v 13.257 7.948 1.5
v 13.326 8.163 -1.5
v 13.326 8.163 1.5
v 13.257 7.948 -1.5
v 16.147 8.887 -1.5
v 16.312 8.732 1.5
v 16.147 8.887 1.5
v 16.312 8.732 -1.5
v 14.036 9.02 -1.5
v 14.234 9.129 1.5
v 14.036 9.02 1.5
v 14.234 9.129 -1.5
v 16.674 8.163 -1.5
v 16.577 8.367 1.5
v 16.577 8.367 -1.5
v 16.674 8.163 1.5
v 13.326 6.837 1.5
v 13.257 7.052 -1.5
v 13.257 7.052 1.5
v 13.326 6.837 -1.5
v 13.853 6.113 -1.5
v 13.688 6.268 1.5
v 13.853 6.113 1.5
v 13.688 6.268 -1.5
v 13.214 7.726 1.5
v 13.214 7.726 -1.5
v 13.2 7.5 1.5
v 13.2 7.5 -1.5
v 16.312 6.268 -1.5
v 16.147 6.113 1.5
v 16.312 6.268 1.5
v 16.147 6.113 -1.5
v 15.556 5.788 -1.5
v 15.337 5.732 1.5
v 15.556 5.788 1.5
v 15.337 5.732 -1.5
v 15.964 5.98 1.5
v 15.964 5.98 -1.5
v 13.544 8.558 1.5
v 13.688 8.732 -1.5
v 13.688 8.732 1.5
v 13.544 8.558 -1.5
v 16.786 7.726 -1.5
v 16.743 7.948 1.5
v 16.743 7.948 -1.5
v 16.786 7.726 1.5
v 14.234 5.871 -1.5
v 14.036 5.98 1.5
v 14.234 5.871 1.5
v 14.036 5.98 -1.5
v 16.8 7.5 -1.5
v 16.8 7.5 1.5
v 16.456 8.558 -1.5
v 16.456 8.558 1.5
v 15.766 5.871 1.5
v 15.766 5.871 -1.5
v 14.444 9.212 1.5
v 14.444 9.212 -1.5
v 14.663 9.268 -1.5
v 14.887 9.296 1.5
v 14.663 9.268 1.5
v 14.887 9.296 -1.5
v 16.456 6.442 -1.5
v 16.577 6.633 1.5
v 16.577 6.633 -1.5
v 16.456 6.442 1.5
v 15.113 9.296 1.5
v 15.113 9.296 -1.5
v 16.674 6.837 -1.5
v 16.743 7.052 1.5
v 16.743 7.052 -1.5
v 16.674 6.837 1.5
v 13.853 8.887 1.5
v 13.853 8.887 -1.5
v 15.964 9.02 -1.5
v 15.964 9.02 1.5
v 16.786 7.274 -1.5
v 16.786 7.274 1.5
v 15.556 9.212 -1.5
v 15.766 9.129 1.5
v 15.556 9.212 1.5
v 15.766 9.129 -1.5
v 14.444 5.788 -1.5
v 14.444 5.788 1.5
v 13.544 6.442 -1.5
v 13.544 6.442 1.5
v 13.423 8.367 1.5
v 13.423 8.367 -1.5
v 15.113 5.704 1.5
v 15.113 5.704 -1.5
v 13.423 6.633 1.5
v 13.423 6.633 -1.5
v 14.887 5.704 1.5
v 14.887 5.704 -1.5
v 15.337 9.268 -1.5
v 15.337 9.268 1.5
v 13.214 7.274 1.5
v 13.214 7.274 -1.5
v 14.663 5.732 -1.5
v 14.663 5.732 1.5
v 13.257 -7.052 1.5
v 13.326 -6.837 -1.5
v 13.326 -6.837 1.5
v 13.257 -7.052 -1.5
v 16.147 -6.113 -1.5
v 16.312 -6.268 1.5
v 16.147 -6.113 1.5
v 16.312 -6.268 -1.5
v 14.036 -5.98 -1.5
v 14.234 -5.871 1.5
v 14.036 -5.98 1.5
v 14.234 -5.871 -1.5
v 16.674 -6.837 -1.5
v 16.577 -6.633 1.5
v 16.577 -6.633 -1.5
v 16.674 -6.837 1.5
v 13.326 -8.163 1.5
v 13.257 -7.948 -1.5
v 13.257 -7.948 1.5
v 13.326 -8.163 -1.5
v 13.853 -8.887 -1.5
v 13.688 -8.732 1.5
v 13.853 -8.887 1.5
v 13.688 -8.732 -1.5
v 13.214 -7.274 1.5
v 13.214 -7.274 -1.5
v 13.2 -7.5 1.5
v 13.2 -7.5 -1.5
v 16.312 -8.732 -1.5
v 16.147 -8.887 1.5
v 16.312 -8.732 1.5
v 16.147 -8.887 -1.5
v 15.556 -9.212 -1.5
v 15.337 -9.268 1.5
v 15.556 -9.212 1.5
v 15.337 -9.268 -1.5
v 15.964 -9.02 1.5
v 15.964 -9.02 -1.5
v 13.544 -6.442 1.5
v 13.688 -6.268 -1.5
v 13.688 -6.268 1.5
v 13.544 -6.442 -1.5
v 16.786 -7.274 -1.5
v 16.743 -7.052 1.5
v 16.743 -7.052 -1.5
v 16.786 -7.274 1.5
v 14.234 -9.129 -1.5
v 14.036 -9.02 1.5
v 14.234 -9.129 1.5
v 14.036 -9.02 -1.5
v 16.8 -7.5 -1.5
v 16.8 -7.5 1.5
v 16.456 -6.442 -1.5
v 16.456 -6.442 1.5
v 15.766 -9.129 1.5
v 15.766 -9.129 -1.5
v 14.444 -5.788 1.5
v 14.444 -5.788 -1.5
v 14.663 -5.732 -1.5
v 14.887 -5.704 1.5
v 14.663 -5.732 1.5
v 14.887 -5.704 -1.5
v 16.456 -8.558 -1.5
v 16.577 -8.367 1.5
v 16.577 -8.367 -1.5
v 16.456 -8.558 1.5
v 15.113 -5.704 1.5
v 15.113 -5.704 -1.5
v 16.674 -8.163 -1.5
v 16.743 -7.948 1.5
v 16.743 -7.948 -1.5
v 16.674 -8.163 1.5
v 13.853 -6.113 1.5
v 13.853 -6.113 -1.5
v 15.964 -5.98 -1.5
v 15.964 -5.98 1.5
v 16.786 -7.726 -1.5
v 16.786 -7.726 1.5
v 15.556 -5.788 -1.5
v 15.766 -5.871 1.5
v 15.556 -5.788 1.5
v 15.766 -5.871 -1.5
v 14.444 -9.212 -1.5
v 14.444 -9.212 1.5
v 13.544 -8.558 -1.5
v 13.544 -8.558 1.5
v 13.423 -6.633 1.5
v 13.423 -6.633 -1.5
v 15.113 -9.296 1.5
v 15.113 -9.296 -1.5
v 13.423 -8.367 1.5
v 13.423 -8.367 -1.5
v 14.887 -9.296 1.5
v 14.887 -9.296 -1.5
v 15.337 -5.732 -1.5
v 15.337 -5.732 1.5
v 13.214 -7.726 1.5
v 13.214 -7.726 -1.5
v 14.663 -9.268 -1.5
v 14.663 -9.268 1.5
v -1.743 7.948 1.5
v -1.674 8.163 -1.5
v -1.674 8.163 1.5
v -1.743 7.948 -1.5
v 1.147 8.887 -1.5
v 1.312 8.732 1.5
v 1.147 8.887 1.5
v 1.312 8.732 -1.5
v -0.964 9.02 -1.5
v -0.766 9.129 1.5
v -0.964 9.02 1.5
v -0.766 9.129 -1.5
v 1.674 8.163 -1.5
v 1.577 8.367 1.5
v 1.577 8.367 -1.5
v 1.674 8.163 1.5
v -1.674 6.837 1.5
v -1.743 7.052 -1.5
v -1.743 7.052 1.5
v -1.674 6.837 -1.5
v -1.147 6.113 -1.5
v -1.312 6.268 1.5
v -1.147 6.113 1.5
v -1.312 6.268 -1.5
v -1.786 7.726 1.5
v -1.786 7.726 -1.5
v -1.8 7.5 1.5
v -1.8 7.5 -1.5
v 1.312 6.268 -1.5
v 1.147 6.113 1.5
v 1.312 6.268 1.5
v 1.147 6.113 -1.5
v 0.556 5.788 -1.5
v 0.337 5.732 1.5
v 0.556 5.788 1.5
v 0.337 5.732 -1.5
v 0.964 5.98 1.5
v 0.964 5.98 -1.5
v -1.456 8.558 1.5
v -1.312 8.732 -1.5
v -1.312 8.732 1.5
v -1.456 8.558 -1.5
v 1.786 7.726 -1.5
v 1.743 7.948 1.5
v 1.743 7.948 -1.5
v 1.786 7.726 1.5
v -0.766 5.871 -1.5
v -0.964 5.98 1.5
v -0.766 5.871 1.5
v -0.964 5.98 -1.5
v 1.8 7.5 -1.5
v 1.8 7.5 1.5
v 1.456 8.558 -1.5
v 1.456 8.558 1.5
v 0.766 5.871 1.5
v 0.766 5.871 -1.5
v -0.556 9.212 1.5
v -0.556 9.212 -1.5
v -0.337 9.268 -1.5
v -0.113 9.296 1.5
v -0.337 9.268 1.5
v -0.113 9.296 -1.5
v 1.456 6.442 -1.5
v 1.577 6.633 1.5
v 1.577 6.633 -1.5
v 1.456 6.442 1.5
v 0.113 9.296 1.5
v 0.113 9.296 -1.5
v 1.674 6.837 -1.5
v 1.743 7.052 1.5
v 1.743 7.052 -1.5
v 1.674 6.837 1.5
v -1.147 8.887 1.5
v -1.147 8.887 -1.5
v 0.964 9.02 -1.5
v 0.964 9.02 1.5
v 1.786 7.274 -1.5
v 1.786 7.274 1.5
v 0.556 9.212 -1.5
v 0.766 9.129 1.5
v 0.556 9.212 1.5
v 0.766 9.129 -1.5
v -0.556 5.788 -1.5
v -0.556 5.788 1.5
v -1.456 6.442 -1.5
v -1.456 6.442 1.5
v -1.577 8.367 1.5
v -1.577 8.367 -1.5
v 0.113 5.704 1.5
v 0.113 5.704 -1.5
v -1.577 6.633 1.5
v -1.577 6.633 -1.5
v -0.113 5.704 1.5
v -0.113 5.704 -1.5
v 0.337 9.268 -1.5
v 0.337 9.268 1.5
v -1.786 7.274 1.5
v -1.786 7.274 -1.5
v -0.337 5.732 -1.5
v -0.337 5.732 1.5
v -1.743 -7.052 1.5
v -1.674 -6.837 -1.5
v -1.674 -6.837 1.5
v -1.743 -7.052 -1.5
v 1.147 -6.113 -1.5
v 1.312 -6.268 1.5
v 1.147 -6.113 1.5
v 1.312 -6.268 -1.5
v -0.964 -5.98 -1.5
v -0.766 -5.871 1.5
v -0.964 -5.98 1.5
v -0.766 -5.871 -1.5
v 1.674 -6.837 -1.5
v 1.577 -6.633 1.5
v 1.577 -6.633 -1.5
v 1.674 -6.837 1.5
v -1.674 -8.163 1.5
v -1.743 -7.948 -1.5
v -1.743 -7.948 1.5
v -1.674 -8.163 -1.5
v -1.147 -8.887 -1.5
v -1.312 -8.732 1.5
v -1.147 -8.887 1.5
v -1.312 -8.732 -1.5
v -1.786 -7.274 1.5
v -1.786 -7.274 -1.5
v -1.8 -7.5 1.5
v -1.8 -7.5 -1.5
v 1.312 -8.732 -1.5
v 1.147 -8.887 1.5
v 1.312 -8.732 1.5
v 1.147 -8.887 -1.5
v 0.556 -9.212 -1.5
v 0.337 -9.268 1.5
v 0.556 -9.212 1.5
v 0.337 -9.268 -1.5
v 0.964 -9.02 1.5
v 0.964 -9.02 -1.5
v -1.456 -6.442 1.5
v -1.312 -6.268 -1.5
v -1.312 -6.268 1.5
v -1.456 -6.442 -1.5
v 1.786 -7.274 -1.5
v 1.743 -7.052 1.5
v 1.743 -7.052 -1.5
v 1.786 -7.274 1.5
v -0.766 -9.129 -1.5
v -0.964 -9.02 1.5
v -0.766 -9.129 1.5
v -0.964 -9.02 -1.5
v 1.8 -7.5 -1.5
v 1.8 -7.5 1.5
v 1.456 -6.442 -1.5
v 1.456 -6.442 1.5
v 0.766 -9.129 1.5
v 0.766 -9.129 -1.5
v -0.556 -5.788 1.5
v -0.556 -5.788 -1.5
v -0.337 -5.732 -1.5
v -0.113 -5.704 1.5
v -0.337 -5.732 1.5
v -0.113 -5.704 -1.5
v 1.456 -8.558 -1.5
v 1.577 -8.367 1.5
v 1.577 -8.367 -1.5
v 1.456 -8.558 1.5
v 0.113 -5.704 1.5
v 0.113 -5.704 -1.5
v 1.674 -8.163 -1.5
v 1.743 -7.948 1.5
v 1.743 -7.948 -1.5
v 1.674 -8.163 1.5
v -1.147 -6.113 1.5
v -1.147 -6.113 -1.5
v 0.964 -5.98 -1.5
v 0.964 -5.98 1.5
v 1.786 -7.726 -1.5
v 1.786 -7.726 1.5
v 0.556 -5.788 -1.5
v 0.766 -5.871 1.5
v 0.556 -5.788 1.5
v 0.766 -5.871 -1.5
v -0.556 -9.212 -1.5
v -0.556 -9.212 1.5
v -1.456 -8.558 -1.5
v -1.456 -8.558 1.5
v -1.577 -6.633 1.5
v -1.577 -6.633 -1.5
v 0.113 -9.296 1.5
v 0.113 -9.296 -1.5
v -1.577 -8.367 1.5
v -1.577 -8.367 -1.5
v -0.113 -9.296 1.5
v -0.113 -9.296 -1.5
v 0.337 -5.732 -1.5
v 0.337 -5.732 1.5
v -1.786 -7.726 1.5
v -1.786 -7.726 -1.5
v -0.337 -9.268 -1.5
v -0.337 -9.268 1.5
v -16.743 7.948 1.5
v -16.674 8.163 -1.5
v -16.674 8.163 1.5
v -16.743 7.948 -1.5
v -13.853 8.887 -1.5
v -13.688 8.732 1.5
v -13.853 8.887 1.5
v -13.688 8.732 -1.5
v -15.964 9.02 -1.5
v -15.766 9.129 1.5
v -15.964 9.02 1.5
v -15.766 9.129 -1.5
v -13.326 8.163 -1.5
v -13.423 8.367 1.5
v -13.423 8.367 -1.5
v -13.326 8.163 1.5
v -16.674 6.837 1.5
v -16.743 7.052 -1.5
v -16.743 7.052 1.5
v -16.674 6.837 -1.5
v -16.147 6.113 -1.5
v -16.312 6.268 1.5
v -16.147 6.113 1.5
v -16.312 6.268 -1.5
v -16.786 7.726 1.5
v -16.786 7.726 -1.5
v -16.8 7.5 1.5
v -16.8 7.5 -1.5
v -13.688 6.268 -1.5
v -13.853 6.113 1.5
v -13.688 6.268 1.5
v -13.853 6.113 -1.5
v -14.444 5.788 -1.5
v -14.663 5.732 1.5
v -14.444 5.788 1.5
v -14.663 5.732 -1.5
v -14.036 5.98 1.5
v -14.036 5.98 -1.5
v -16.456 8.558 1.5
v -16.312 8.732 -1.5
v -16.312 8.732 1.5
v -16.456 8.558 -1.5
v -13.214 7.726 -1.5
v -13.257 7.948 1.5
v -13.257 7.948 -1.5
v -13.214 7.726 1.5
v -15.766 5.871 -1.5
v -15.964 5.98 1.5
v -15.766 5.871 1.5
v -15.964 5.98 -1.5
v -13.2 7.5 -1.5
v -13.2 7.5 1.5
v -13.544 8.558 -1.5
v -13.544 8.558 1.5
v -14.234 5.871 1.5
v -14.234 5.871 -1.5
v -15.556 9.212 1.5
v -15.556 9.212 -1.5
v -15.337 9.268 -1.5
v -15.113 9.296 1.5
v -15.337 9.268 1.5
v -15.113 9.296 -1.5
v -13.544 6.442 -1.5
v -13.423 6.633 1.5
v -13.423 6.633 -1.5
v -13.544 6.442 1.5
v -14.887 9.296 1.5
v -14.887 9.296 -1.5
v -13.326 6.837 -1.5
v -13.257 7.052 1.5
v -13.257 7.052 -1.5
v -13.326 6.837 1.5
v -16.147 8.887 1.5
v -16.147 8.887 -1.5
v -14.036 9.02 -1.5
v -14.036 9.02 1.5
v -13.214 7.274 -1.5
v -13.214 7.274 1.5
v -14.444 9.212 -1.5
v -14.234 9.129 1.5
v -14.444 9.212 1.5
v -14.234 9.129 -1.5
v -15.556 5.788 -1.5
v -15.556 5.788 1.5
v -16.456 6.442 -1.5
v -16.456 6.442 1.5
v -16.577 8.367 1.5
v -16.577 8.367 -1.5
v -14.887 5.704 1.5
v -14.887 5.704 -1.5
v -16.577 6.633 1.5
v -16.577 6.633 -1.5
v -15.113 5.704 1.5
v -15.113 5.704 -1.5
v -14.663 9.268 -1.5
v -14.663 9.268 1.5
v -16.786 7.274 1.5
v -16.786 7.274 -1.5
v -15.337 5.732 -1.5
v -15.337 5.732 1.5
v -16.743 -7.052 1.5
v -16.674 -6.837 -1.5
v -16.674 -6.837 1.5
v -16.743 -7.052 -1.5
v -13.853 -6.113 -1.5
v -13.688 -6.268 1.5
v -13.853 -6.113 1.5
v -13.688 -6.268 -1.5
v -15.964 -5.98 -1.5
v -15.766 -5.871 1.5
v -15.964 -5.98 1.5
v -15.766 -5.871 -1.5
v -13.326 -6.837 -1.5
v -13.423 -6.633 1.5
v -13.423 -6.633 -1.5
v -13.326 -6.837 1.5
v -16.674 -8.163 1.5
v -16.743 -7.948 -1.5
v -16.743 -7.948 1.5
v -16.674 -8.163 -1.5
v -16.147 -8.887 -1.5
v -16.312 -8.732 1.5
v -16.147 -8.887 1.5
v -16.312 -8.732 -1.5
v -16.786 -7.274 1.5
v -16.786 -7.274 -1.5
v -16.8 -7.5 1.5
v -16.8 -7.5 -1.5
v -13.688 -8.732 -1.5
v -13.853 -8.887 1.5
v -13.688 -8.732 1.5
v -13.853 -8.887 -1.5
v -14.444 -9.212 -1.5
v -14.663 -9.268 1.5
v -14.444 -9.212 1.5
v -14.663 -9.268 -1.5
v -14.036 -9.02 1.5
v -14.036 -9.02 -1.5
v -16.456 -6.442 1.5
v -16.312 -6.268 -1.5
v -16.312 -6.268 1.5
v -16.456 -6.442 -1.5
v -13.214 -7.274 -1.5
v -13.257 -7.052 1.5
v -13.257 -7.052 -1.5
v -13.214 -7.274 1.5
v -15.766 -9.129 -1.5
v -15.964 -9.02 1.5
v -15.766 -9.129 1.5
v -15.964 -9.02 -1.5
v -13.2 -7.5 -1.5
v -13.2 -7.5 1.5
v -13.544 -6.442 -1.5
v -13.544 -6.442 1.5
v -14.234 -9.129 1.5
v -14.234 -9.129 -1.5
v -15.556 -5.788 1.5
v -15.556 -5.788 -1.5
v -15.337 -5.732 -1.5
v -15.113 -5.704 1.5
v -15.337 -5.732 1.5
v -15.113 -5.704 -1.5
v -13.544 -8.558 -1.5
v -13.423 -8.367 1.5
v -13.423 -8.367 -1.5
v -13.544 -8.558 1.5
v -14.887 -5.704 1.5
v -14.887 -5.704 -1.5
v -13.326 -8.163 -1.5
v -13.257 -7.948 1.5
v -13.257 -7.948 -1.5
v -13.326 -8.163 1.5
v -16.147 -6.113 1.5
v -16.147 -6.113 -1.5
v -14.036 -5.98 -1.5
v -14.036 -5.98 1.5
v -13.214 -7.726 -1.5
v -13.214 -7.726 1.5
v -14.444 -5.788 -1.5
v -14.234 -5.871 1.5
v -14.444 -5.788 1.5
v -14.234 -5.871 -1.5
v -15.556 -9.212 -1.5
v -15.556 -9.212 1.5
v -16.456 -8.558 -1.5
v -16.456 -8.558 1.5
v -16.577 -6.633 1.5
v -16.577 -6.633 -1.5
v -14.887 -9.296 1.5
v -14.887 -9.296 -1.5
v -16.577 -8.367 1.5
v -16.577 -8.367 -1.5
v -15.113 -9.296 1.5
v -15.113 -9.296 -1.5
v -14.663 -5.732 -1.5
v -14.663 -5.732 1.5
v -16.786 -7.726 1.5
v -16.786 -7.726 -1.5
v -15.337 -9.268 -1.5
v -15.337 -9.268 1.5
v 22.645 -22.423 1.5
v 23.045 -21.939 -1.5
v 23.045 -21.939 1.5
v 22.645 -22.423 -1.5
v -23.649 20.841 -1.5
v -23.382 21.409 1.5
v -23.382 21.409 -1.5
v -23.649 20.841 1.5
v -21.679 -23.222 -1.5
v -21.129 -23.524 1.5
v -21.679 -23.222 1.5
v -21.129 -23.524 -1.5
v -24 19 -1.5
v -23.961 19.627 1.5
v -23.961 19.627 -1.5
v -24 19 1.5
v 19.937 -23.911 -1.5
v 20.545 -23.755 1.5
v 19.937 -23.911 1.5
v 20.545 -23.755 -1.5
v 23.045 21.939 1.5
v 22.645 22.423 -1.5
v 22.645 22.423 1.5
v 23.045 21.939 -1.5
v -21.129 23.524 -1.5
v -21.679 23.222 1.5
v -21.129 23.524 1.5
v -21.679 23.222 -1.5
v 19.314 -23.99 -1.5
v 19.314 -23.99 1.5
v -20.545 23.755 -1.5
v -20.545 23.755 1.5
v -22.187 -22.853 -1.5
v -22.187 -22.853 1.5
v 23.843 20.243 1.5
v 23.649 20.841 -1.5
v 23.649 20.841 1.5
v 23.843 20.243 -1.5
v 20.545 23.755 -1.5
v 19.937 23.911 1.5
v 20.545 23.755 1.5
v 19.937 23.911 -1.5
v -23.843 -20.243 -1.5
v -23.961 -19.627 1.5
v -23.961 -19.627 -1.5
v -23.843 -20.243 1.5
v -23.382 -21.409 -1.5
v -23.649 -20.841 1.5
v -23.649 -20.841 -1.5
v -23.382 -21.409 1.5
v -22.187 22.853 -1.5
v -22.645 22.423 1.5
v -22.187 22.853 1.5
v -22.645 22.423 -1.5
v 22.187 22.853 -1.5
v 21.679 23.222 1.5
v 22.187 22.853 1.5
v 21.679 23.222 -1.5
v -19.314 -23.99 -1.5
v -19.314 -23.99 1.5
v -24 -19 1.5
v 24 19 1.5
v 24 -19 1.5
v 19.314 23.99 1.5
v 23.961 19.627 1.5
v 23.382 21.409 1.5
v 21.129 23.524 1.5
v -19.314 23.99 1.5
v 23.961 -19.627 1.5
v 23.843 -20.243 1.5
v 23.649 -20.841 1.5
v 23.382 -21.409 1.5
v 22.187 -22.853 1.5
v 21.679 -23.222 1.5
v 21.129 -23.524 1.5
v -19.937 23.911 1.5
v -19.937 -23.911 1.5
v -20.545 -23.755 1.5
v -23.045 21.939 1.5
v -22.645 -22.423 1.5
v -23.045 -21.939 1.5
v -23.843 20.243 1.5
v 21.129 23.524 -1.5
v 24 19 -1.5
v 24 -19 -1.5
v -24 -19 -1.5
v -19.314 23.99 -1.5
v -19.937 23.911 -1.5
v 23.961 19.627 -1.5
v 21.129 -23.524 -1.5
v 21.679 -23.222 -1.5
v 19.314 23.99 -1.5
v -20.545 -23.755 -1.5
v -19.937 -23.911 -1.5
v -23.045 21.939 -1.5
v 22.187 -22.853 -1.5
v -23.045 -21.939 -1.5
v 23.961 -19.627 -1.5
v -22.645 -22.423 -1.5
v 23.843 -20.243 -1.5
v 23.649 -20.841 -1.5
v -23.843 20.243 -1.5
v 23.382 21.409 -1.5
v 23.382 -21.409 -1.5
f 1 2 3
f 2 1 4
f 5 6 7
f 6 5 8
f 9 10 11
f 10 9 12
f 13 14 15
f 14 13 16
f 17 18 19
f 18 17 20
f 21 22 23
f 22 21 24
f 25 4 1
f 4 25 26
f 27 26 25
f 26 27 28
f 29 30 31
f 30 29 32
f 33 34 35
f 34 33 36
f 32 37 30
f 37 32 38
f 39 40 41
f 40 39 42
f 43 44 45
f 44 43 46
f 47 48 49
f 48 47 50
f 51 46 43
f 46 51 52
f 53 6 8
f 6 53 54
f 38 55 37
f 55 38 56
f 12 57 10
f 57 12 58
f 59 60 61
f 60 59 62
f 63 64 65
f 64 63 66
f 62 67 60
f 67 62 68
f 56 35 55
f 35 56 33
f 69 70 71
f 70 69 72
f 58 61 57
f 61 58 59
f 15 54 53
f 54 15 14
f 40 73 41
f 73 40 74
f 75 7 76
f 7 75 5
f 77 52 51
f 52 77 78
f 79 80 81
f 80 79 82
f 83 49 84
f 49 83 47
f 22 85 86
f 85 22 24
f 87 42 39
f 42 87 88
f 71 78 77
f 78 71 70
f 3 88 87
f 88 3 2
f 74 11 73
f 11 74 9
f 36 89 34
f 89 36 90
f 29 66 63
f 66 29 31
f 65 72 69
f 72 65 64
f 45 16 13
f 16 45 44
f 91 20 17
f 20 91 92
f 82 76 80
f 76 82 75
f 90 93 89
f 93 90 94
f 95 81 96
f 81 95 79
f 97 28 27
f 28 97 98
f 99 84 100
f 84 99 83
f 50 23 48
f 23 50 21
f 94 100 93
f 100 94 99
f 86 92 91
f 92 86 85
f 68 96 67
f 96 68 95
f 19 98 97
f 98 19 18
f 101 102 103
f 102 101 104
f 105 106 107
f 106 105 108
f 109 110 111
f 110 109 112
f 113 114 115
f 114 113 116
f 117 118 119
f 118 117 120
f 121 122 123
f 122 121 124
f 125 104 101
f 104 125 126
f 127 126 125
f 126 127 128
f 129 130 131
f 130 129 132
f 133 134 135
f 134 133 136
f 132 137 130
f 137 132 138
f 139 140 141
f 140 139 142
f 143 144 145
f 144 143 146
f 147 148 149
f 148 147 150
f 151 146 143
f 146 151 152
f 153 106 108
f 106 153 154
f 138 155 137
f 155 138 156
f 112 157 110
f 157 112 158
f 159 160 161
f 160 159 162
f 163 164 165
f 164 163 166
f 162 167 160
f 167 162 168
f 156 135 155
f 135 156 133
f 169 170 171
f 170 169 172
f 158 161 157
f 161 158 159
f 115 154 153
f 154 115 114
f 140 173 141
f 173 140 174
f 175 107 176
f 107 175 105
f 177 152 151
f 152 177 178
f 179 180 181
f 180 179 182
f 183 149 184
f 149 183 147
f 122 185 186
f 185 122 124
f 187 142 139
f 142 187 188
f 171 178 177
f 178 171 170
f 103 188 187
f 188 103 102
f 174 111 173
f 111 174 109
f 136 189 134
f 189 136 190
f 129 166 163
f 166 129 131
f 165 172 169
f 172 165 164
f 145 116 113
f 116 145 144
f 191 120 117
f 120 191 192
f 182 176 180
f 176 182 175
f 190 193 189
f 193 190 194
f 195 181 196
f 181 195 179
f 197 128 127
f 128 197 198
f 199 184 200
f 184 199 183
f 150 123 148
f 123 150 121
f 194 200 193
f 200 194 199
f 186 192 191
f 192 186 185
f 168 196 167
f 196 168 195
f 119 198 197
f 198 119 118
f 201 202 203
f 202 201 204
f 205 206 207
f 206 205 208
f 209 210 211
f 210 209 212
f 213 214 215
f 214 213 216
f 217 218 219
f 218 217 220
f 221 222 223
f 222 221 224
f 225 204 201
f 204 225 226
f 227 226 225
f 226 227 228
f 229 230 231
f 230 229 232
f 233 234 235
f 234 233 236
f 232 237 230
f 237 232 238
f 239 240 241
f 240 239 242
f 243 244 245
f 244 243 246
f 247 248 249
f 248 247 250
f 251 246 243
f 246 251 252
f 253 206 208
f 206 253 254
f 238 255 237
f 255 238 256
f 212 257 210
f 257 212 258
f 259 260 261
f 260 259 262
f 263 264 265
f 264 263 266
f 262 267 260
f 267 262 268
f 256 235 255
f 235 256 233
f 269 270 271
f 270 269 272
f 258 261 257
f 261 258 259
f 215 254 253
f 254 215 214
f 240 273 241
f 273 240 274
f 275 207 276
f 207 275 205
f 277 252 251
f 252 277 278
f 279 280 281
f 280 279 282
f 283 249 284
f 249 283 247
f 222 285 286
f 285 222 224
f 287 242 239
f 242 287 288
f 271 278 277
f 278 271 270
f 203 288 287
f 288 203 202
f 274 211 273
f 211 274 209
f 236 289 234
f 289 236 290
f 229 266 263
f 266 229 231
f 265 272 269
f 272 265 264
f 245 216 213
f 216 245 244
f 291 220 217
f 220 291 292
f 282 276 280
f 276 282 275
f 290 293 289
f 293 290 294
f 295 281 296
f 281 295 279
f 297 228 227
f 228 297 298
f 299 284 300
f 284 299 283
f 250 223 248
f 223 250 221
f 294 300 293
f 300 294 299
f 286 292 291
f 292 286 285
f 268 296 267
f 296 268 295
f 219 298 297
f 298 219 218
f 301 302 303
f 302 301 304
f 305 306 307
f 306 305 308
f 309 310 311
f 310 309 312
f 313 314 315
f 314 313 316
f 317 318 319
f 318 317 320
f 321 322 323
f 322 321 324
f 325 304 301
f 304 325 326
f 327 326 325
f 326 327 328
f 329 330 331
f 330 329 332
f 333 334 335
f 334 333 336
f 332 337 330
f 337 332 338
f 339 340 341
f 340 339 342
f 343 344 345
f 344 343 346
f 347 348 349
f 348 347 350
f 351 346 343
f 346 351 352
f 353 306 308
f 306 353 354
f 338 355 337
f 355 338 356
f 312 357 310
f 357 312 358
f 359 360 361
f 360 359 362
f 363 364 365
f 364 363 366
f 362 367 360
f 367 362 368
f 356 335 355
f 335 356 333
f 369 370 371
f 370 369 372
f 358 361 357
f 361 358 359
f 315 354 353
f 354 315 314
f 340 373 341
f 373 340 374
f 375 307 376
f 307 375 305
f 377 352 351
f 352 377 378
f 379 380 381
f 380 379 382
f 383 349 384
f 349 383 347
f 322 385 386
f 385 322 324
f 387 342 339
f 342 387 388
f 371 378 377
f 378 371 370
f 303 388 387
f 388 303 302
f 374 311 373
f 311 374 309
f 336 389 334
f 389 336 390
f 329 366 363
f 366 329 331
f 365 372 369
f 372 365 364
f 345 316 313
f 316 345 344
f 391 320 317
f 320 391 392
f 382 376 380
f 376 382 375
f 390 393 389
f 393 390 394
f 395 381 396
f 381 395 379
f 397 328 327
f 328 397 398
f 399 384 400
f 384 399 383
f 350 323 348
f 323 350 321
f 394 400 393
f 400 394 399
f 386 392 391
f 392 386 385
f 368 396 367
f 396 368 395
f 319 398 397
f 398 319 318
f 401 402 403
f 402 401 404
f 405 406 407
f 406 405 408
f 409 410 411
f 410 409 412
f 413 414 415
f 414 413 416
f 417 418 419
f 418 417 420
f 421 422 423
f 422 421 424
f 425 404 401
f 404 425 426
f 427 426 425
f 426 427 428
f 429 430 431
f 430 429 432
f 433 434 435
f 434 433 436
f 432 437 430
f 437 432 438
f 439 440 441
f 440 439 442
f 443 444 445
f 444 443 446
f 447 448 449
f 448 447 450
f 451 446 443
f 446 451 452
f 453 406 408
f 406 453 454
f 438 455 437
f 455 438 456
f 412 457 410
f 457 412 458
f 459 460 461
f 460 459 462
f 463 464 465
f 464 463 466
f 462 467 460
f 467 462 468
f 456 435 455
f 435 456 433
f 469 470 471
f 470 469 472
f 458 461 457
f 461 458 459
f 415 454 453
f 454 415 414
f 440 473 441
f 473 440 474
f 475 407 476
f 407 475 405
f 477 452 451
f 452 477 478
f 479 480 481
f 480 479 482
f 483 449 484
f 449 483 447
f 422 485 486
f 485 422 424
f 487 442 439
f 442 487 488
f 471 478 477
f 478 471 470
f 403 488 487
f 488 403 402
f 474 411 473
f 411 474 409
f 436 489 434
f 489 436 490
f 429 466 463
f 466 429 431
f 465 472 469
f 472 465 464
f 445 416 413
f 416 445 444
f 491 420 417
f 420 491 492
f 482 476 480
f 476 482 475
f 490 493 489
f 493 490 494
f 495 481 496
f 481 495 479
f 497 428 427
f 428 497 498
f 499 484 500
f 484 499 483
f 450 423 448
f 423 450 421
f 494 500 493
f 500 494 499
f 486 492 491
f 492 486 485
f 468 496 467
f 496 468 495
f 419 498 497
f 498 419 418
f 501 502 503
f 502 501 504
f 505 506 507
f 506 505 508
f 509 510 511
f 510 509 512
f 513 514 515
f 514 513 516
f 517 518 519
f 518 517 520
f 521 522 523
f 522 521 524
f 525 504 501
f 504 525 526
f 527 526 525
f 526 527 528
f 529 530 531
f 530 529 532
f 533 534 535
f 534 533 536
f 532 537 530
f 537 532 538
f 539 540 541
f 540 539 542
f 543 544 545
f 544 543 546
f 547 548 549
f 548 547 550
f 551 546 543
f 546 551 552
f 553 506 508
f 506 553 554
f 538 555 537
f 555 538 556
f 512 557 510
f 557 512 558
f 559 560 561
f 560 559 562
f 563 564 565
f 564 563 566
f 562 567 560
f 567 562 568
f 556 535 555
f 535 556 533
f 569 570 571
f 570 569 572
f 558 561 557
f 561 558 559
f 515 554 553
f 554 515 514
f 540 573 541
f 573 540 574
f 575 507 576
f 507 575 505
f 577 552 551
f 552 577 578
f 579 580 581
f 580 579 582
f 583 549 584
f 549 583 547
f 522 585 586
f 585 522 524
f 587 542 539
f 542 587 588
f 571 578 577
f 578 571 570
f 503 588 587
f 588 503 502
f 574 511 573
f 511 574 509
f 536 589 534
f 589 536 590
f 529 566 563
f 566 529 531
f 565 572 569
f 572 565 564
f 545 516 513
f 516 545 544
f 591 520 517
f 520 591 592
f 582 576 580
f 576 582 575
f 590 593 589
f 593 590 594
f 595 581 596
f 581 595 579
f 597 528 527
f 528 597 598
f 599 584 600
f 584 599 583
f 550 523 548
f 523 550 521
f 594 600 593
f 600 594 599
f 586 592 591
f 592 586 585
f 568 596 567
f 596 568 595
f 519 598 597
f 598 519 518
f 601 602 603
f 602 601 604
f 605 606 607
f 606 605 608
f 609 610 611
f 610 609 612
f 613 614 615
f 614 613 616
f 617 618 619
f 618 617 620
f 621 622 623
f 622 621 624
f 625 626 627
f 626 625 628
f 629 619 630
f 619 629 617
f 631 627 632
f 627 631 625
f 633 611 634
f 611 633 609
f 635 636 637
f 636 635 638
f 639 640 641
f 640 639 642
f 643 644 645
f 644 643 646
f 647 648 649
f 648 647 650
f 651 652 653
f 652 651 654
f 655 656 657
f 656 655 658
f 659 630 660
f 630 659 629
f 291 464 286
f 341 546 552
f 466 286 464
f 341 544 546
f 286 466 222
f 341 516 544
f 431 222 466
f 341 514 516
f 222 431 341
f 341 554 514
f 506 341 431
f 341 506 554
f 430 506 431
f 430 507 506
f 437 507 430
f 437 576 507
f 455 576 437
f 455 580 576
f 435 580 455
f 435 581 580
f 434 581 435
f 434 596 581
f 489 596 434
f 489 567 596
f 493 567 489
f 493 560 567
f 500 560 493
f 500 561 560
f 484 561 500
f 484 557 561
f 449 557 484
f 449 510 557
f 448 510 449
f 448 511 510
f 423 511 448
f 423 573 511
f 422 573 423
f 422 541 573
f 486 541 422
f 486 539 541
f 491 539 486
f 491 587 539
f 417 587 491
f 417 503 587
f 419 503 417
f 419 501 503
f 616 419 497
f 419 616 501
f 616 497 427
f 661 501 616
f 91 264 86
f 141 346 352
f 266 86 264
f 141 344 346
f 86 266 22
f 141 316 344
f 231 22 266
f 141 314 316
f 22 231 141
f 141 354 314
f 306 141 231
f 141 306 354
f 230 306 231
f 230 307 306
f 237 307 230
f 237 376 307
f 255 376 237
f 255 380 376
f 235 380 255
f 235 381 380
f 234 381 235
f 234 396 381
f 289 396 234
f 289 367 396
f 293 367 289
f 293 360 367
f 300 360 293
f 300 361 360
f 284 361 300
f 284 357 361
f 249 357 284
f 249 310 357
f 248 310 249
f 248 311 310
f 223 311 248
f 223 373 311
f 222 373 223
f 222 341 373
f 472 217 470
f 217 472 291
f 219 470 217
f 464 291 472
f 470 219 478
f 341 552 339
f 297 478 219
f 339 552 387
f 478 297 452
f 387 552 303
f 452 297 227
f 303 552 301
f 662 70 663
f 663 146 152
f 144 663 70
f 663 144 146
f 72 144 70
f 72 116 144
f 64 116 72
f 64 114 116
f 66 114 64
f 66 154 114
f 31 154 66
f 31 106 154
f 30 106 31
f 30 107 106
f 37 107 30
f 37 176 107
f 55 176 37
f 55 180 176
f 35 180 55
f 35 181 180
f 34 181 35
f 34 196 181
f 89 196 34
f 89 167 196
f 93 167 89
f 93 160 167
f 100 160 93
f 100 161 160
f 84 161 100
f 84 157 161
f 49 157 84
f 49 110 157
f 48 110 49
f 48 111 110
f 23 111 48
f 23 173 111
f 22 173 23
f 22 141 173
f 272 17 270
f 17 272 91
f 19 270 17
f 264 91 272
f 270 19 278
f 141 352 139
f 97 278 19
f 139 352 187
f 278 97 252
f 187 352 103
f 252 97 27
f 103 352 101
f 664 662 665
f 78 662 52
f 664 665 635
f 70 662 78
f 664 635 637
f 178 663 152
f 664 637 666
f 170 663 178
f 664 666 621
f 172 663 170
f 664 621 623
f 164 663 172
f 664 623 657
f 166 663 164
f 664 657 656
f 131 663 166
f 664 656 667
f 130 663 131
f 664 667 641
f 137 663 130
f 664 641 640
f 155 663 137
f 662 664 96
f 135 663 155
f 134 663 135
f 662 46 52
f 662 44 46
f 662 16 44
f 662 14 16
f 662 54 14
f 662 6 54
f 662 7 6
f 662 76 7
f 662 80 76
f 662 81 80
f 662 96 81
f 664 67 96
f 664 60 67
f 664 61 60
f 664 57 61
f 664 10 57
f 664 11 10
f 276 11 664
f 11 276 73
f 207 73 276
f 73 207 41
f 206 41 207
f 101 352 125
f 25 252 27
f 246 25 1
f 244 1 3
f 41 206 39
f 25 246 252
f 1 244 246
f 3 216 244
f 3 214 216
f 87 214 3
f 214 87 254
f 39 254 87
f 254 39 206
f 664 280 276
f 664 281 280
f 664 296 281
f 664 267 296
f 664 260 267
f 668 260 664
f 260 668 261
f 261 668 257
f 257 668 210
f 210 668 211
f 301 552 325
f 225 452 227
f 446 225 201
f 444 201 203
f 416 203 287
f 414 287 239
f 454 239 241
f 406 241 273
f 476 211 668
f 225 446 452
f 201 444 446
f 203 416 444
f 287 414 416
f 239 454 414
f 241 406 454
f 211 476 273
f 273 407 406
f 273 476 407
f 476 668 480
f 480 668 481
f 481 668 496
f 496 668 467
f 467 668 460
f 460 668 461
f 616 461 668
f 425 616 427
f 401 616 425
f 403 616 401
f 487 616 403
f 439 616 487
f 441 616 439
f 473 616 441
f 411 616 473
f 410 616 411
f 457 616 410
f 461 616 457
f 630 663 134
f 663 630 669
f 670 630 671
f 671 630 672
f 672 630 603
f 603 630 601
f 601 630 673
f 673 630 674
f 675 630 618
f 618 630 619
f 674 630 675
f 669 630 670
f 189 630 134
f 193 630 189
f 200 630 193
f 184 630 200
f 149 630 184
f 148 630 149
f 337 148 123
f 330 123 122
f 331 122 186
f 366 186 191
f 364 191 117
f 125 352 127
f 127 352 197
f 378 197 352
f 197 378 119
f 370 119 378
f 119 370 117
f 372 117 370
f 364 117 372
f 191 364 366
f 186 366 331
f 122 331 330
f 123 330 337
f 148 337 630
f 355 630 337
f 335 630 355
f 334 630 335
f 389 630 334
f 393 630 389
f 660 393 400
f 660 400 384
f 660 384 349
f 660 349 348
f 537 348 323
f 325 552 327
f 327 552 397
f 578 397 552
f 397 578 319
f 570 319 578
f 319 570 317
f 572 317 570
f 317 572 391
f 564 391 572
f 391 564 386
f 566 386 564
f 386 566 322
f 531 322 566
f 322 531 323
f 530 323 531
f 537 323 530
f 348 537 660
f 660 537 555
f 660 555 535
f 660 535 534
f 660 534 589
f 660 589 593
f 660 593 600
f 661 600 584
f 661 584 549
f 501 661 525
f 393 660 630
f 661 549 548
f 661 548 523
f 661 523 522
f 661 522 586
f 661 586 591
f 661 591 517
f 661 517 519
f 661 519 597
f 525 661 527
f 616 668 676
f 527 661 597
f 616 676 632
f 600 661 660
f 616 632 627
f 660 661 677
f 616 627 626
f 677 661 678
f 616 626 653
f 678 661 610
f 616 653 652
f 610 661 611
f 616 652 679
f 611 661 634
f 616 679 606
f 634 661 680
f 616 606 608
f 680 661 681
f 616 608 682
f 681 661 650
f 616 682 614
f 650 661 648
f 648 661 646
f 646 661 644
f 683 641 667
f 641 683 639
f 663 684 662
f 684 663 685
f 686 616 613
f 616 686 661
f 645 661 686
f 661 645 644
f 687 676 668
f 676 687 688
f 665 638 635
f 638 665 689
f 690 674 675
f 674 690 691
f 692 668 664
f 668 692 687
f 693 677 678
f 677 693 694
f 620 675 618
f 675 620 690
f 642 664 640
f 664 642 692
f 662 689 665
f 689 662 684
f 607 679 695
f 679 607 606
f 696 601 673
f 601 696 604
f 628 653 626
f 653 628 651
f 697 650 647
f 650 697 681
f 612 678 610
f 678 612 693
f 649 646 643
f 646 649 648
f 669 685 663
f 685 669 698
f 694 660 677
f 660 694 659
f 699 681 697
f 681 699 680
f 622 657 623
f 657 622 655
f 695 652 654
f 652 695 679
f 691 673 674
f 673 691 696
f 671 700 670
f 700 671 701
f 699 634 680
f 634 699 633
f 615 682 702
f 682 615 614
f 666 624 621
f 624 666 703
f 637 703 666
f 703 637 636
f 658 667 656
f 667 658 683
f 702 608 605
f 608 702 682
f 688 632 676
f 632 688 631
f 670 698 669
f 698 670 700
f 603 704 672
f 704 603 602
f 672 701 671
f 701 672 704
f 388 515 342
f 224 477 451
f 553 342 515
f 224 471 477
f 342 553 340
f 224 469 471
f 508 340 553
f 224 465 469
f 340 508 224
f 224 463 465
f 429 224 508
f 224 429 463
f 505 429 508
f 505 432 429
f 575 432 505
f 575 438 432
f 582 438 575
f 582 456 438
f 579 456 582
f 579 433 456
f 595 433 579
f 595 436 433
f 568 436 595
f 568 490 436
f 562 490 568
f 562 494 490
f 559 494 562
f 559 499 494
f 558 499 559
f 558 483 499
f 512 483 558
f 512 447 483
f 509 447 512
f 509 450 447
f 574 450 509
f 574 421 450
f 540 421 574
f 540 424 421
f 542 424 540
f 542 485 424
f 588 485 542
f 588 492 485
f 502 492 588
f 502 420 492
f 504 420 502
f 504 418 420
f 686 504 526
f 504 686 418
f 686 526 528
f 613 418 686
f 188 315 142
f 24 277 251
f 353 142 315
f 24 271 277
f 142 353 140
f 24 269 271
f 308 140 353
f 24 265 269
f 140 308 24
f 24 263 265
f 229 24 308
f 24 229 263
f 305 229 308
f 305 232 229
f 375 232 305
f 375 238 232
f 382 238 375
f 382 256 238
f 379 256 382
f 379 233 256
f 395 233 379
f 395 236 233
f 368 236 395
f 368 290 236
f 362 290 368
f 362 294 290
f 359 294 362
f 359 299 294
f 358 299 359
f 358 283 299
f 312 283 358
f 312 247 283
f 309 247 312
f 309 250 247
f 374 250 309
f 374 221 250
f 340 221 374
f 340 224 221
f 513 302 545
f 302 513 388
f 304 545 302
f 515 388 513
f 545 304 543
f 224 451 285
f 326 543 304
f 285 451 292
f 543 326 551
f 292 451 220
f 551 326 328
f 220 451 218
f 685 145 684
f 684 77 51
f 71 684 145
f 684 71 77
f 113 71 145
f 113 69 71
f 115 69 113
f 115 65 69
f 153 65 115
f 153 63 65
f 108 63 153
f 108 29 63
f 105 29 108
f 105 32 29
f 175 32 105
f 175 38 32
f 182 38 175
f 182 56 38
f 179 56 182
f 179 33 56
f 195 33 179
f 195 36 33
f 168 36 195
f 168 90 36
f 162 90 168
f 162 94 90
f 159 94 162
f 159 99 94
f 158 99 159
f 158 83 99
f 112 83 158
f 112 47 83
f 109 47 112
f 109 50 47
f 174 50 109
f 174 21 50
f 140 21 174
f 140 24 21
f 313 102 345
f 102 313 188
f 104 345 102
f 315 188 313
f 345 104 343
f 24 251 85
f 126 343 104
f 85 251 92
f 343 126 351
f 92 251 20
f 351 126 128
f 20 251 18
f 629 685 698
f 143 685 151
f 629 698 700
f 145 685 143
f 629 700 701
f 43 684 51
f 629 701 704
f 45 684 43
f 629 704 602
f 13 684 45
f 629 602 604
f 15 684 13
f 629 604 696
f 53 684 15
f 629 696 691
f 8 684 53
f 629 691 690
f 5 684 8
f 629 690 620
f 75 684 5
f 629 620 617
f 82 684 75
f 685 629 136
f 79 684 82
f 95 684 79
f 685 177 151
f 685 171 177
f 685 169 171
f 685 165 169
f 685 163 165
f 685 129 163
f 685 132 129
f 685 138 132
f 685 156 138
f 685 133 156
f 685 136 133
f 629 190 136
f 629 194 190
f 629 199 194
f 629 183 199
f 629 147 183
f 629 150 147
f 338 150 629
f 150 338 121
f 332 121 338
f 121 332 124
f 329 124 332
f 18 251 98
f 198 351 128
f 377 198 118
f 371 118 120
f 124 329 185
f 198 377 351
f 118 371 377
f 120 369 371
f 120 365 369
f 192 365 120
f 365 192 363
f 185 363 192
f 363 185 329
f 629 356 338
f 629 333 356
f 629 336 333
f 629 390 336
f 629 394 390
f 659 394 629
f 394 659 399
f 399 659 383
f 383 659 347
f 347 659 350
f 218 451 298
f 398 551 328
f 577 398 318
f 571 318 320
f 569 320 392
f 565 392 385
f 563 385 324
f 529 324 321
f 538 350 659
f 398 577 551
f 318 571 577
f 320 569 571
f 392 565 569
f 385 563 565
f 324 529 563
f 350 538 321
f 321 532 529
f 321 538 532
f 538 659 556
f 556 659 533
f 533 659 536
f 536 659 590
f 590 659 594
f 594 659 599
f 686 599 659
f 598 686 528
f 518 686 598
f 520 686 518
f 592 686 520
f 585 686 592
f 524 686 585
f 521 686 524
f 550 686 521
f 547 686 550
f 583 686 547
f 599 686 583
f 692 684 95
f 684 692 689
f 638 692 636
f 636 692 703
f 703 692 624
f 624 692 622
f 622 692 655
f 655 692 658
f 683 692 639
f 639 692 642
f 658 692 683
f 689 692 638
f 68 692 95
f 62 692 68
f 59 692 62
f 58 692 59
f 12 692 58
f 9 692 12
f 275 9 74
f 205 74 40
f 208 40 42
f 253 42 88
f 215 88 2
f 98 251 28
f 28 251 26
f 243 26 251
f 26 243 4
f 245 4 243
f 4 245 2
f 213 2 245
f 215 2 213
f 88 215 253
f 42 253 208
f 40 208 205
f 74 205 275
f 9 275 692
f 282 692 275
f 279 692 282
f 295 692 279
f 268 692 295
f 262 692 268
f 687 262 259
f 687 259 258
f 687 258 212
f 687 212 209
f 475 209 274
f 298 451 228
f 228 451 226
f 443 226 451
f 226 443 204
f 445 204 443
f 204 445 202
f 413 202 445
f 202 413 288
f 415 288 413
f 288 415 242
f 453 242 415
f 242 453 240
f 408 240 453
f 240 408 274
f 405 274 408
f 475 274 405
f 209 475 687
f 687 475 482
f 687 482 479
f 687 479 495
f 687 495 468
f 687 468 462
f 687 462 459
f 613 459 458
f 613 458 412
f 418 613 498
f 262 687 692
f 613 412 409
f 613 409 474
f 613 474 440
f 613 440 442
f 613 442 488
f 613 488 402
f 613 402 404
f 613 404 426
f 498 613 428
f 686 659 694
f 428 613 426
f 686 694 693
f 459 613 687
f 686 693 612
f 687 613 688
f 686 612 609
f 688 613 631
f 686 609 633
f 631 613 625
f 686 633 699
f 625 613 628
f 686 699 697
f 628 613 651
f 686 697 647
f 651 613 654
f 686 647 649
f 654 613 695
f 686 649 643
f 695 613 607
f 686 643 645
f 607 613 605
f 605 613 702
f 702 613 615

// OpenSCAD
$fn = 50;


difference() {
	union() {
		translate(v = [0, 0, -1.5000000000]) {
			hull() {
				translate(v = [-19.0000000000, 19.0000000000, 0]) {
					cylinder(h = 3, r = 5);
				}
				translate(v = [19.0000000000, 19.0000000000, 0]) {
					cylinder(h = 3, r = 5);
				}
				translate(v = [-19.0000000000, -19.0000000000, 0]) {
					cylinder(h = 3, r = 5);
				}
				translate(v = [19.0000000000, -19.0000000000, 0]) {
					cylinder(h = 3, r = 5);
				}
			}
		}
	}
	union() {
		translate(v = [15, 7.5000000000, 0]) {
			rotate(a = [0, 0, 0]) {
				difference() {
					union() {
						translate(v = [0, 0, -50.0000000000]) {
							cylinder(h = 100, r = 1.8000000000);
						}
					}
					union();
				}
			}
		}
		translate(v = [15, -7.5000000000, 0]) {
			rotate(a = [0, 0, 0]) {
				difference() {
					union() {
						translate(v = [0, 0, -50.0000000000]) {
							cylinder(h = 100, r = 1.8000000000);
						}
					}
					union();
				}
			}
		}
		translate(v = [0, 7.5000000000, 0]) {
			rotate(a = [0, 0, 0]) {
				difference() {
					union() {
						translate(v = [0, 0, -50.0000000000]) {
							cylinder(h = 100, r = 1.8000000000);
						}
					}
					union();
				}
			}
		}
		translate(v = [0, -7.5000000000, 0]) {
			rotate(a = [0, 0, 0]) {
				difference() {
					union() {
						translate(v = [0, 0, -50.0000000000]) {
							cylinder(h = 100, r = 1.8000000000);
						}
					}
					union();
				}
			}
		}
		translate(v = [-15, 7.5000000000, 0]) {
			rotate(a = [0, 0, 0]) {
				difference() {
					union() {
						translate(v = [0, 0, -50.0000000000]) {
							cylinder(h = 100, r = 1.8000000000);
						}
					}
					union();
				}
			}
		}
		translate(v = [-15, -7.5000000000, 0]) {
			rotate(a = [0, 0, 0]) {
				difference() {
					union() {
						translate(v = [0, 0, -50.0000000000]) {
							cylinder(h = 100, r = 1.8000000000);
						}
					}
					union();
				}
			}
		}
	}
}
